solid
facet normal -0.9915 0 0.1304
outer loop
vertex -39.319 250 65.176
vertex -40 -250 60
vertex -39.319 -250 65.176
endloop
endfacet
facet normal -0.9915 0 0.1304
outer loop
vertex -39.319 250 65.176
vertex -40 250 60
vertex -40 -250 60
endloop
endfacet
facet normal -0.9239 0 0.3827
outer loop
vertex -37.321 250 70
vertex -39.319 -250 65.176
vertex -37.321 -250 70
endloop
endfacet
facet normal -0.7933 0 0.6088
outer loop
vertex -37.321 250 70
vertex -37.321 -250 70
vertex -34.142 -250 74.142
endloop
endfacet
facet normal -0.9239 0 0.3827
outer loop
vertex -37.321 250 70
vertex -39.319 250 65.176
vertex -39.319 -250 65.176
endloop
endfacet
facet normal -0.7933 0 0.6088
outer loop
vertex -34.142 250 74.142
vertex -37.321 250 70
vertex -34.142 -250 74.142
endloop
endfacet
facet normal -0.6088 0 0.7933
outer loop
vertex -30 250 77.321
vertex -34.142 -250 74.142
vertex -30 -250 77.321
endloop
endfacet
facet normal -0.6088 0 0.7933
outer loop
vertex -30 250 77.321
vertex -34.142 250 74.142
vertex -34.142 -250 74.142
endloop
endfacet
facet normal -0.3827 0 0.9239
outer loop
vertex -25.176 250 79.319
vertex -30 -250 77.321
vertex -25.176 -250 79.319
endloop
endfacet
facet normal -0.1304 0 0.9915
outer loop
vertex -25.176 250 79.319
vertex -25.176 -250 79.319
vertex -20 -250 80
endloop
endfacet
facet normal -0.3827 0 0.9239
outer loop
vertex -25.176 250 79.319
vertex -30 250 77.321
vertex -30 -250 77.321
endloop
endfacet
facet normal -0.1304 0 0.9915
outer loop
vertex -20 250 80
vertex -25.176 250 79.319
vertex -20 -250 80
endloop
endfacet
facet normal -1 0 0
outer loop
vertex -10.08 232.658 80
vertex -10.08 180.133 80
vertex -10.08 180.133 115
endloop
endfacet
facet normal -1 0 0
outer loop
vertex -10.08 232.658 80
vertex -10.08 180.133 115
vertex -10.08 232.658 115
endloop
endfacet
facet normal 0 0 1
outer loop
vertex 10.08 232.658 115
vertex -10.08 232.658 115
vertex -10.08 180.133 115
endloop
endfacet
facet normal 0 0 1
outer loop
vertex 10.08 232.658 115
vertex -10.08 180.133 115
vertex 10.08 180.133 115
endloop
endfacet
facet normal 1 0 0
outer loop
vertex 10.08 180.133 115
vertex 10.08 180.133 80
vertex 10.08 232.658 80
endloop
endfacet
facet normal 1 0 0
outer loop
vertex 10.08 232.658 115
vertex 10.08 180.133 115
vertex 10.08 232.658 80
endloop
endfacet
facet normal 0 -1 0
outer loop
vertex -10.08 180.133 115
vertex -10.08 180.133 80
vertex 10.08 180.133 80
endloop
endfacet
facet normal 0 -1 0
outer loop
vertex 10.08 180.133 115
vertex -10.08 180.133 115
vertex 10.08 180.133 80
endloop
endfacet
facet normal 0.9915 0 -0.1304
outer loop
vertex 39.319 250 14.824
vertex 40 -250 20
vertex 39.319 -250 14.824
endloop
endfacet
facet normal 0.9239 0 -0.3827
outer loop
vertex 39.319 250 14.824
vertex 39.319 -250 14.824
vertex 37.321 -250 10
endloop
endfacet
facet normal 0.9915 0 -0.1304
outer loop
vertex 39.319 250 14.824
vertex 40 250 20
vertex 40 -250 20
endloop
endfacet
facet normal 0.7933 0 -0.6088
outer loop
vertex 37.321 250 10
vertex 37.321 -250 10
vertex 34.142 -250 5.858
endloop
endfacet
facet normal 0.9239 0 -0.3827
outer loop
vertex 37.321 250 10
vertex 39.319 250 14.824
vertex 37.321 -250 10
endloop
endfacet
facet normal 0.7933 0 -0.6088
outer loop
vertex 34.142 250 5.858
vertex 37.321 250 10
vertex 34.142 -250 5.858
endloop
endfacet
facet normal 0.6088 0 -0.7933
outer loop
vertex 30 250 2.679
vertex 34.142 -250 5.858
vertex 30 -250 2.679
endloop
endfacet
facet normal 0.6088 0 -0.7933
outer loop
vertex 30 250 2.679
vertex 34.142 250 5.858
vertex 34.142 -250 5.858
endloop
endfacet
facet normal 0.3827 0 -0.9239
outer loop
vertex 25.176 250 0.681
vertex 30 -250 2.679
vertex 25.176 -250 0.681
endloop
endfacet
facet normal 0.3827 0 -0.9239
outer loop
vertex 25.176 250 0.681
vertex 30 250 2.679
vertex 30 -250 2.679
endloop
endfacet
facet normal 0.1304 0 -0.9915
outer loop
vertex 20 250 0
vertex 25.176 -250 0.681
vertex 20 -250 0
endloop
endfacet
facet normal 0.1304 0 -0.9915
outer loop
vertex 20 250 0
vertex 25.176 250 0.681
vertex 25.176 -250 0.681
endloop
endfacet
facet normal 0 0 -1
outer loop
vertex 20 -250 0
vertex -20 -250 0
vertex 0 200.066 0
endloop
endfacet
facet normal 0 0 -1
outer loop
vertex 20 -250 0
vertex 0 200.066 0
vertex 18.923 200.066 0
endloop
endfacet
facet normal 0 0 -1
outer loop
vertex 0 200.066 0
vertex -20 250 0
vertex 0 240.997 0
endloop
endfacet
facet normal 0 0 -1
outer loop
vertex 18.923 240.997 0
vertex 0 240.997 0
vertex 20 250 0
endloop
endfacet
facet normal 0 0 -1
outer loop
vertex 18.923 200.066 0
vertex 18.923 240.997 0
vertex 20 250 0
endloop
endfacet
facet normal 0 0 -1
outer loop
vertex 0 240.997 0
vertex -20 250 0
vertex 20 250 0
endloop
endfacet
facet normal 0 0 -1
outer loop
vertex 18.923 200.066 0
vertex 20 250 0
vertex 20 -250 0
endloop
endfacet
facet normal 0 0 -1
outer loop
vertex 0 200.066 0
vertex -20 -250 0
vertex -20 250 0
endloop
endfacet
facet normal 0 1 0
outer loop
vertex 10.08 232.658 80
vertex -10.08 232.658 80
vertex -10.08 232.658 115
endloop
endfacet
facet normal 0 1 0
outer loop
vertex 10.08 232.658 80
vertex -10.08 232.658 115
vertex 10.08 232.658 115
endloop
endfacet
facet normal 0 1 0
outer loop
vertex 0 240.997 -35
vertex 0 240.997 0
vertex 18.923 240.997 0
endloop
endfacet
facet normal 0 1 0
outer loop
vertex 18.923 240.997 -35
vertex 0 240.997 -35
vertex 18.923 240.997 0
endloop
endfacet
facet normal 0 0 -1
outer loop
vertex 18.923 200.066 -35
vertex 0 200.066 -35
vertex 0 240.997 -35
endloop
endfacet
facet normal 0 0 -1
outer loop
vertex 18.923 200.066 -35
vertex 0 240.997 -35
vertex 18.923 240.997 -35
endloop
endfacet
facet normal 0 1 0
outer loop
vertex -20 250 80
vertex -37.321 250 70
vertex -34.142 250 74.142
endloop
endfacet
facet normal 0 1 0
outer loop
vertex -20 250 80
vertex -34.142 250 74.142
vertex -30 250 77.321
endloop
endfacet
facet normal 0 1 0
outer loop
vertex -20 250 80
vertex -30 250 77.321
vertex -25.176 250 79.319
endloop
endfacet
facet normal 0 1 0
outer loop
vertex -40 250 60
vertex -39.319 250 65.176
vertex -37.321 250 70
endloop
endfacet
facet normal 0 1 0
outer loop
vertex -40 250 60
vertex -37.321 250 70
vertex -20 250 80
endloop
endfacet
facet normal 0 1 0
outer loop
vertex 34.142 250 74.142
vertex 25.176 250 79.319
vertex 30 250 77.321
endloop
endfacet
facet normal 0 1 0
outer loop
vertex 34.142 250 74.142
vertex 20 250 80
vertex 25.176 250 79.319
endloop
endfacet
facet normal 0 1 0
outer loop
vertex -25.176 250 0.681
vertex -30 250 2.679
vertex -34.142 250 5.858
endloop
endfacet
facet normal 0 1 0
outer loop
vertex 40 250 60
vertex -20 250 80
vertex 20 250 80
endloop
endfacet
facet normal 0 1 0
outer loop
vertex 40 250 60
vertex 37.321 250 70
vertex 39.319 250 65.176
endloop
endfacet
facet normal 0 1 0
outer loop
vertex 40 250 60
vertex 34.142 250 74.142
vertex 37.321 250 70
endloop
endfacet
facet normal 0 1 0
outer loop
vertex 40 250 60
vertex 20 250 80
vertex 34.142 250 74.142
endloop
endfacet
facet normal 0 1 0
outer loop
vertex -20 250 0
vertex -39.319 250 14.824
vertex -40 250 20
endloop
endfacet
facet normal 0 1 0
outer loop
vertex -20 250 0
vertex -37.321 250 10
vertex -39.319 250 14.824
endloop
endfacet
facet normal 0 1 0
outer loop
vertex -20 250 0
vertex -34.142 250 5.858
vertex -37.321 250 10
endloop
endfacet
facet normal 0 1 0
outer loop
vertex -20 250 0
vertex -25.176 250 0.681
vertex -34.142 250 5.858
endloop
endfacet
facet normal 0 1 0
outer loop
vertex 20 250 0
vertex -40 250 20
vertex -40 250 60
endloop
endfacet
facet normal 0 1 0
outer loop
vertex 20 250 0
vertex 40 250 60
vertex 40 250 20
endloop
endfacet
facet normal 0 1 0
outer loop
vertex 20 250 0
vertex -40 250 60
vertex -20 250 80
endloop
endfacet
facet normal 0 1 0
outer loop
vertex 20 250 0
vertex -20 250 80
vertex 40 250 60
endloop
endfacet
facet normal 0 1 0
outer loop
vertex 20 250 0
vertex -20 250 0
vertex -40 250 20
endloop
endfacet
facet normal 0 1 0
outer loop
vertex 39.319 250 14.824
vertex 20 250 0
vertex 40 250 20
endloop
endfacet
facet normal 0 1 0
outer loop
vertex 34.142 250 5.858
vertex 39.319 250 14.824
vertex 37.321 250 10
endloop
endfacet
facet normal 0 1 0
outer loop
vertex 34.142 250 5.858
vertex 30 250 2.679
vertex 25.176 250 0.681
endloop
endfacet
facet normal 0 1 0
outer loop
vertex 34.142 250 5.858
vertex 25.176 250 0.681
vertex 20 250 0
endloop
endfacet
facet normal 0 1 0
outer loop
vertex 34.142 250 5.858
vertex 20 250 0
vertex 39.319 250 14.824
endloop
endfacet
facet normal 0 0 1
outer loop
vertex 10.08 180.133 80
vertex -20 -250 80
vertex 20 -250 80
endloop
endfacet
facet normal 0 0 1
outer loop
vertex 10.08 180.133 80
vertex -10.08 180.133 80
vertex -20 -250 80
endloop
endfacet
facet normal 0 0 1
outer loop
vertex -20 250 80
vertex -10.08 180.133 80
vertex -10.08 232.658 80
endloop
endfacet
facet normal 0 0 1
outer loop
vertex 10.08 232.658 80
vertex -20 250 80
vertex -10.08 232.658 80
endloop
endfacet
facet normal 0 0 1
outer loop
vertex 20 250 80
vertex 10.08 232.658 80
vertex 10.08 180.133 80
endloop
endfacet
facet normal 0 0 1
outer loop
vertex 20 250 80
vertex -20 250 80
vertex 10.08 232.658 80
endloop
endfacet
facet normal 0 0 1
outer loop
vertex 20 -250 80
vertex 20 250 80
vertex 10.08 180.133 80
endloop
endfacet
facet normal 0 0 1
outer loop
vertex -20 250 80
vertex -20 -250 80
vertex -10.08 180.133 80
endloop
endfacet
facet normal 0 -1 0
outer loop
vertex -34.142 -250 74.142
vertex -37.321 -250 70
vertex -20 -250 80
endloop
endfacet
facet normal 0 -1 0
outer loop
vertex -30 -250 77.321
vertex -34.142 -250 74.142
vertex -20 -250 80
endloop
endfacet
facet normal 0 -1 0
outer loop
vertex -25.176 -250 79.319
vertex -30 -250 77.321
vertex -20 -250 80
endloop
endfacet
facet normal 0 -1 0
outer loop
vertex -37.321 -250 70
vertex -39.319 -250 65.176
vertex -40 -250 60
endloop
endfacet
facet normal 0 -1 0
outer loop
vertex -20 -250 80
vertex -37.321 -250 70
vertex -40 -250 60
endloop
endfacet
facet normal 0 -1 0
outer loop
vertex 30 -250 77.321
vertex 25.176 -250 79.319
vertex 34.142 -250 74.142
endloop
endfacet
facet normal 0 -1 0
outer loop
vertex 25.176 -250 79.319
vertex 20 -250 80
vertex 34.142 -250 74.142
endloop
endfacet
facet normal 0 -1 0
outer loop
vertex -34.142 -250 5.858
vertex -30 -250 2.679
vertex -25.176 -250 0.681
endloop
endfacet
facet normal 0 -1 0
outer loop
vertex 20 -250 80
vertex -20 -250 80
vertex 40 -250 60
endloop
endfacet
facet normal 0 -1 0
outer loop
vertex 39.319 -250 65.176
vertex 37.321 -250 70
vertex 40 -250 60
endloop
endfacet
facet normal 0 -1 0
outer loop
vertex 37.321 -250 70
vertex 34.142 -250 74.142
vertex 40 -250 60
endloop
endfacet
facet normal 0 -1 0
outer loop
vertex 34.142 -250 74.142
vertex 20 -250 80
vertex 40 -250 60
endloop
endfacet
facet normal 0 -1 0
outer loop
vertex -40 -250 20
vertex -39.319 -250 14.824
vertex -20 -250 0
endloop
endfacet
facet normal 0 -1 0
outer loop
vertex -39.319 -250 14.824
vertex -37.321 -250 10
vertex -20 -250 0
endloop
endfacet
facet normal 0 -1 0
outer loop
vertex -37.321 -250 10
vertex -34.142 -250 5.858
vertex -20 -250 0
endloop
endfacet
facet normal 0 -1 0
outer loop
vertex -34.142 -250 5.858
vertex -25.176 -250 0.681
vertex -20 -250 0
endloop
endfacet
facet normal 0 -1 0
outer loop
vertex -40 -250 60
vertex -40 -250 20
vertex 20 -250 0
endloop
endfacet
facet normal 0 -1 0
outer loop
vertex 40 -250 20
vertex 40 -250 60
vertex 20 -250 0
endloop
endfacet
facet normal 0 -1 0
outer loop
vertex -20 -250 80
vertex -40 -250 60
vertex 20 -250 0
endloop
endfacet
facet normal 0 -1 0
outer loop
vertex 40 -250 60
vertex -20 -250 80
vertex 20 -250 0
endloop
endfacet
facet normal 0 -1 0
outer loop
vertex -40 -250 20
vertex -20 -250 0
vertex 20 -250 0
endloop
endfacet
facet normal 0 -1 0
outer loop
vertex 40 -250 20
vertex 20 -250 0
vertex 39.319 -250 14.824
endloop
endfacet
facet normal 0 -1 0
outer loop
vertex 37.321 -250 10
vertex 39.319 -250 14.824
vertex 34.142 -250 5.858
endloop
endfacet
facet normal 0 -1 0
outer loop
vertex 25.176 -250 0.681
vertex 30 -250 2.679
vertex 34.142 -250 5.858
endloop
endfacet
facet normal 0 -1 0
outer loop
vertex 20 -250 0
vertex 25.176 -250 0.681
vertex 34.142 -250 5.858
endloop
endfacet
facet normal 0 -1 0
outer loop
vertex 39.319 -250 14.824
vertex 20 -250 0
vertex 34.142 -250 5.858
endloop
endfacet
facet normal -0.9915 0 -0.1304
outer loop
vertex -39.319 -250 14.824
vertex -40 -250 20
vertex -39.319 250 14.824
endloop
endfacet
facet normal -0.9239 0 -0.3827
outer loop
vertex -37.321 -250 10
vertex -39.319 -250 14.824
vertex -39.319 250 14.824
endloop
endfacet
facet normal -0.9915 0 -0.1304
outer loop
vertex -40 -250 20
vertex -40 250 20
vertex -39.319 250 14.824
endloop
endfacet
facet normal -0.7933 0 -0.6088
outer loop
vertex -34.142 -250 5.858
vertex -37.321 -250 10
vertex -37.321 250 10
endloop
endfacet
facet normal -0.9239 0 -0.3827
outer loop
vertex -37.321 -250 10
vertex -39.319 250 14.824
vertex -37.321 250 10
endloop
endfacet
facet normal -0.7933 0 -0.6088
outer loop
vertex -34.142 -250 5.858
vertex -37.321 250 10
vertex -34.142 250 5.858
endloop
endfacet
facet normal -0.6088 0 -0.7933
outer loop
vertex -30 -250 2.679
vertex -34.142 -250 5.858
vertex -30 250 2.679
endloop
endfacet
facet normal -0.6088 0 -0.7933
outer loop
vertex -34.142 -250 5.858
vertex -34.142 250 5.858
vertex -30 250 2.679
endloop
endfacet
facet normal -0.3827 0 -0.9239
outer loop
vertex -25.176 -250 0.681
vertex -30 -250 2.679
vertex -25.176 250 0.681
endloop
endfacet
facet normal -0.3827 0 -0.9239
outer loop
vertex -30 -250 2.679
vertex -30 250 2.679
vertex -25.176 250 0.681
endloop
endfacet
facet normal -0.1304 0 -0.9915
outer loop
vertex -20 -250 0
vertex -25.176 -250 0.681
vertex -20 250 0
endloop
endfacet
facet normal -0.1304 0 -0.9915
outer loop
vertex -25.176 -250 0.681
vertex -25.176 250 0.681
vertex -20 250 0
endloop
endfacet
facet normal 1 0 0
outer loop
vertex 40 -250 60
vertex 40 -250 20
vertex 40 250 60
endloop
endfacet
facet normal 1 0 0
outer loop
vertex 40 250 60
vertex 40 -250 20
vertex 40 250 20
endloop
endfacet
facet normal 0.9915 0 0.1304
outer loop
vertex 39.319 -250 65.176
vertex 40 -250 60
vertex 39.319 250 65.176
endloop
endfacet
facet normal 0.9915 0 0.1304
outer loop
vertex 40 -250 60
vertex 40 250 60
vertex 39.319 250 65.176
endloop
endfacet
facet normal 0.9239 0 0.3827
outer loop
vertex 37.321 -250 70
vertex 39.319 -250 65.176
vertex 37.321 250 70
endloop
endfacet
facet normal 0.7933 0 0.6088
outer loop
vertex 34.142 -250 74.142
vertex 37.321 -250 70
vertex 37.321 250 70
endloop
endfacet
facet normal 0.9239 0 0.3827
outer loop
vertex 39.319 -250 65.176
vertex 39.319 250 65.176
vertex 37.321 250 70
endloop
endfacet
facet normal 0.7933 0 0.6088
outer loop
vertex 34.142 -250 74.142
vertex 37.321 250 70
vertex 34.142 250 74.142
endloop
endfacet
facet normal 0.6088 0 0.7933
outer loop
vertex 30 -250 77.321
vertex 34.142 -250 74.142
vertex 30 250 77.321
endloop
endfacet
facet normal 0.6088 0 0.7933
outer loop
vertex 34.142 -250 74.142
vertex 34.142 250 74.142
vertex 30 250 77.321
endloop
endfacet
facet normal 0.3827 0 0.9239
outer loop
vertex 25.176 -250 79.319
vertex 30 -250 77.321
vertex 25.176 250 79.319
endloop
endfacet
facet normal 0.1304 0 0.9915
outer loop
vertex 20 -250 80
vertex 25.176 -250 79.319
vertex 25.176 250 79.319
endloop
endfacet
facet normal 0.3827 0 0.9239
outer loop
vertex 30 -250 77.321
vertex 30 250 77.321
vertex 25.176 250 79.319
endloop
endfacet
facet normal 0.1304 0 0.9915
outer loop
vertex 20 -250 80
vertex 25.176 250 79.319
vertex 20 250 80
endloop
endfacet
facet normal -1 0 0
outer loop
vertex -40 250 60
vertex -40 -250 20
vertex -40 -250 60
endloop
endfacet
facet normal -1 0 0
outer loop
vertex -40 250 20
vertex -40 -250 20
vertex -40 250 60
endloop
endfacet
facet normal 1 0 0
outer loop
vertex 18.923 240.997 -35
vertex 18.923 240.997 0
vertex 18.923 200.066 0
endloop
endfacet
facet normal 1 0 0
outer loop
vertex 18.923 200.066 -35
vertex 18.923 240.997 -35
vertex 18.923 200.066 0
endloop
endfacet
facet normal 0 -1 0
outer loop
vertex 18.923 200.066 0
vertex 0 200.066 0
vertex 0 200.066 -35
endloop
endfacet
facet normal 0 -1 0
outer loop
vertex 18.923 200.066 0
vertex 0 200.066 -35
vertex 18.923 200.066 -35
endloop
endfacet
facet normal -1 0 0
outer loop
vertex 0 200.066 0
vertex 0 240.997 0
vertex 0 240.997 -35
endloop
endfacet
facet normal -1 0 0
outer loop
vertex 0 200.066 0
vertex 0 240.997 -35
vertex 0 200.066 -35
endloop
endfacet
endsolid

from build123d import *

# Parameters (mm, degrees)
F0_W     = 80
F0_H     = 500
F1_DEPTH = 80
F2_R     = 20
F3_W     = 20.159984
F3_H     = 52.525729
F4_DEPTH = 35
F5_W     = 18.923229
F5_H     = 40.931299
F6_DEPTH = 35


with BuildPart() as f1:
    # F0 (on Top) → F1 (new body)
    with BuildSketch(Plane.XY):
        Rectangle(F0_W, F0_H)
    extrude(amount=F1_DEPTH)

    # F2
    f2_edges = [f1.edges().sort_by_distance(p)[0] for p in [
        (-40, 0, 0),
        (40, 0, 0),
        (40, 0, 80),
        (-40, 0, 80),
    ]]
    fillet(f2_edges, radius=F2_R)

    # F3 (on face) → F4 (join)
    with BuildSketch(Plane.XY.offset(80)):
        with Locations((0, 206.395387)):
            Rectangle(F3_W, F3_H)
    extrude(amount=F4_DEPTH)

    # F5 (on face) → F6 (join)
    with BuildSketch(Plane(origin=(0, 0, 0), x_dir=(1, 0, 0), z_dir=(0, 0, -1))):
        with Locations((9.461614, -220.531561)):
            Rectangle(F5_W, F5_H)
    extrude(amount=F6_DEPTH)


solid = f1.part
